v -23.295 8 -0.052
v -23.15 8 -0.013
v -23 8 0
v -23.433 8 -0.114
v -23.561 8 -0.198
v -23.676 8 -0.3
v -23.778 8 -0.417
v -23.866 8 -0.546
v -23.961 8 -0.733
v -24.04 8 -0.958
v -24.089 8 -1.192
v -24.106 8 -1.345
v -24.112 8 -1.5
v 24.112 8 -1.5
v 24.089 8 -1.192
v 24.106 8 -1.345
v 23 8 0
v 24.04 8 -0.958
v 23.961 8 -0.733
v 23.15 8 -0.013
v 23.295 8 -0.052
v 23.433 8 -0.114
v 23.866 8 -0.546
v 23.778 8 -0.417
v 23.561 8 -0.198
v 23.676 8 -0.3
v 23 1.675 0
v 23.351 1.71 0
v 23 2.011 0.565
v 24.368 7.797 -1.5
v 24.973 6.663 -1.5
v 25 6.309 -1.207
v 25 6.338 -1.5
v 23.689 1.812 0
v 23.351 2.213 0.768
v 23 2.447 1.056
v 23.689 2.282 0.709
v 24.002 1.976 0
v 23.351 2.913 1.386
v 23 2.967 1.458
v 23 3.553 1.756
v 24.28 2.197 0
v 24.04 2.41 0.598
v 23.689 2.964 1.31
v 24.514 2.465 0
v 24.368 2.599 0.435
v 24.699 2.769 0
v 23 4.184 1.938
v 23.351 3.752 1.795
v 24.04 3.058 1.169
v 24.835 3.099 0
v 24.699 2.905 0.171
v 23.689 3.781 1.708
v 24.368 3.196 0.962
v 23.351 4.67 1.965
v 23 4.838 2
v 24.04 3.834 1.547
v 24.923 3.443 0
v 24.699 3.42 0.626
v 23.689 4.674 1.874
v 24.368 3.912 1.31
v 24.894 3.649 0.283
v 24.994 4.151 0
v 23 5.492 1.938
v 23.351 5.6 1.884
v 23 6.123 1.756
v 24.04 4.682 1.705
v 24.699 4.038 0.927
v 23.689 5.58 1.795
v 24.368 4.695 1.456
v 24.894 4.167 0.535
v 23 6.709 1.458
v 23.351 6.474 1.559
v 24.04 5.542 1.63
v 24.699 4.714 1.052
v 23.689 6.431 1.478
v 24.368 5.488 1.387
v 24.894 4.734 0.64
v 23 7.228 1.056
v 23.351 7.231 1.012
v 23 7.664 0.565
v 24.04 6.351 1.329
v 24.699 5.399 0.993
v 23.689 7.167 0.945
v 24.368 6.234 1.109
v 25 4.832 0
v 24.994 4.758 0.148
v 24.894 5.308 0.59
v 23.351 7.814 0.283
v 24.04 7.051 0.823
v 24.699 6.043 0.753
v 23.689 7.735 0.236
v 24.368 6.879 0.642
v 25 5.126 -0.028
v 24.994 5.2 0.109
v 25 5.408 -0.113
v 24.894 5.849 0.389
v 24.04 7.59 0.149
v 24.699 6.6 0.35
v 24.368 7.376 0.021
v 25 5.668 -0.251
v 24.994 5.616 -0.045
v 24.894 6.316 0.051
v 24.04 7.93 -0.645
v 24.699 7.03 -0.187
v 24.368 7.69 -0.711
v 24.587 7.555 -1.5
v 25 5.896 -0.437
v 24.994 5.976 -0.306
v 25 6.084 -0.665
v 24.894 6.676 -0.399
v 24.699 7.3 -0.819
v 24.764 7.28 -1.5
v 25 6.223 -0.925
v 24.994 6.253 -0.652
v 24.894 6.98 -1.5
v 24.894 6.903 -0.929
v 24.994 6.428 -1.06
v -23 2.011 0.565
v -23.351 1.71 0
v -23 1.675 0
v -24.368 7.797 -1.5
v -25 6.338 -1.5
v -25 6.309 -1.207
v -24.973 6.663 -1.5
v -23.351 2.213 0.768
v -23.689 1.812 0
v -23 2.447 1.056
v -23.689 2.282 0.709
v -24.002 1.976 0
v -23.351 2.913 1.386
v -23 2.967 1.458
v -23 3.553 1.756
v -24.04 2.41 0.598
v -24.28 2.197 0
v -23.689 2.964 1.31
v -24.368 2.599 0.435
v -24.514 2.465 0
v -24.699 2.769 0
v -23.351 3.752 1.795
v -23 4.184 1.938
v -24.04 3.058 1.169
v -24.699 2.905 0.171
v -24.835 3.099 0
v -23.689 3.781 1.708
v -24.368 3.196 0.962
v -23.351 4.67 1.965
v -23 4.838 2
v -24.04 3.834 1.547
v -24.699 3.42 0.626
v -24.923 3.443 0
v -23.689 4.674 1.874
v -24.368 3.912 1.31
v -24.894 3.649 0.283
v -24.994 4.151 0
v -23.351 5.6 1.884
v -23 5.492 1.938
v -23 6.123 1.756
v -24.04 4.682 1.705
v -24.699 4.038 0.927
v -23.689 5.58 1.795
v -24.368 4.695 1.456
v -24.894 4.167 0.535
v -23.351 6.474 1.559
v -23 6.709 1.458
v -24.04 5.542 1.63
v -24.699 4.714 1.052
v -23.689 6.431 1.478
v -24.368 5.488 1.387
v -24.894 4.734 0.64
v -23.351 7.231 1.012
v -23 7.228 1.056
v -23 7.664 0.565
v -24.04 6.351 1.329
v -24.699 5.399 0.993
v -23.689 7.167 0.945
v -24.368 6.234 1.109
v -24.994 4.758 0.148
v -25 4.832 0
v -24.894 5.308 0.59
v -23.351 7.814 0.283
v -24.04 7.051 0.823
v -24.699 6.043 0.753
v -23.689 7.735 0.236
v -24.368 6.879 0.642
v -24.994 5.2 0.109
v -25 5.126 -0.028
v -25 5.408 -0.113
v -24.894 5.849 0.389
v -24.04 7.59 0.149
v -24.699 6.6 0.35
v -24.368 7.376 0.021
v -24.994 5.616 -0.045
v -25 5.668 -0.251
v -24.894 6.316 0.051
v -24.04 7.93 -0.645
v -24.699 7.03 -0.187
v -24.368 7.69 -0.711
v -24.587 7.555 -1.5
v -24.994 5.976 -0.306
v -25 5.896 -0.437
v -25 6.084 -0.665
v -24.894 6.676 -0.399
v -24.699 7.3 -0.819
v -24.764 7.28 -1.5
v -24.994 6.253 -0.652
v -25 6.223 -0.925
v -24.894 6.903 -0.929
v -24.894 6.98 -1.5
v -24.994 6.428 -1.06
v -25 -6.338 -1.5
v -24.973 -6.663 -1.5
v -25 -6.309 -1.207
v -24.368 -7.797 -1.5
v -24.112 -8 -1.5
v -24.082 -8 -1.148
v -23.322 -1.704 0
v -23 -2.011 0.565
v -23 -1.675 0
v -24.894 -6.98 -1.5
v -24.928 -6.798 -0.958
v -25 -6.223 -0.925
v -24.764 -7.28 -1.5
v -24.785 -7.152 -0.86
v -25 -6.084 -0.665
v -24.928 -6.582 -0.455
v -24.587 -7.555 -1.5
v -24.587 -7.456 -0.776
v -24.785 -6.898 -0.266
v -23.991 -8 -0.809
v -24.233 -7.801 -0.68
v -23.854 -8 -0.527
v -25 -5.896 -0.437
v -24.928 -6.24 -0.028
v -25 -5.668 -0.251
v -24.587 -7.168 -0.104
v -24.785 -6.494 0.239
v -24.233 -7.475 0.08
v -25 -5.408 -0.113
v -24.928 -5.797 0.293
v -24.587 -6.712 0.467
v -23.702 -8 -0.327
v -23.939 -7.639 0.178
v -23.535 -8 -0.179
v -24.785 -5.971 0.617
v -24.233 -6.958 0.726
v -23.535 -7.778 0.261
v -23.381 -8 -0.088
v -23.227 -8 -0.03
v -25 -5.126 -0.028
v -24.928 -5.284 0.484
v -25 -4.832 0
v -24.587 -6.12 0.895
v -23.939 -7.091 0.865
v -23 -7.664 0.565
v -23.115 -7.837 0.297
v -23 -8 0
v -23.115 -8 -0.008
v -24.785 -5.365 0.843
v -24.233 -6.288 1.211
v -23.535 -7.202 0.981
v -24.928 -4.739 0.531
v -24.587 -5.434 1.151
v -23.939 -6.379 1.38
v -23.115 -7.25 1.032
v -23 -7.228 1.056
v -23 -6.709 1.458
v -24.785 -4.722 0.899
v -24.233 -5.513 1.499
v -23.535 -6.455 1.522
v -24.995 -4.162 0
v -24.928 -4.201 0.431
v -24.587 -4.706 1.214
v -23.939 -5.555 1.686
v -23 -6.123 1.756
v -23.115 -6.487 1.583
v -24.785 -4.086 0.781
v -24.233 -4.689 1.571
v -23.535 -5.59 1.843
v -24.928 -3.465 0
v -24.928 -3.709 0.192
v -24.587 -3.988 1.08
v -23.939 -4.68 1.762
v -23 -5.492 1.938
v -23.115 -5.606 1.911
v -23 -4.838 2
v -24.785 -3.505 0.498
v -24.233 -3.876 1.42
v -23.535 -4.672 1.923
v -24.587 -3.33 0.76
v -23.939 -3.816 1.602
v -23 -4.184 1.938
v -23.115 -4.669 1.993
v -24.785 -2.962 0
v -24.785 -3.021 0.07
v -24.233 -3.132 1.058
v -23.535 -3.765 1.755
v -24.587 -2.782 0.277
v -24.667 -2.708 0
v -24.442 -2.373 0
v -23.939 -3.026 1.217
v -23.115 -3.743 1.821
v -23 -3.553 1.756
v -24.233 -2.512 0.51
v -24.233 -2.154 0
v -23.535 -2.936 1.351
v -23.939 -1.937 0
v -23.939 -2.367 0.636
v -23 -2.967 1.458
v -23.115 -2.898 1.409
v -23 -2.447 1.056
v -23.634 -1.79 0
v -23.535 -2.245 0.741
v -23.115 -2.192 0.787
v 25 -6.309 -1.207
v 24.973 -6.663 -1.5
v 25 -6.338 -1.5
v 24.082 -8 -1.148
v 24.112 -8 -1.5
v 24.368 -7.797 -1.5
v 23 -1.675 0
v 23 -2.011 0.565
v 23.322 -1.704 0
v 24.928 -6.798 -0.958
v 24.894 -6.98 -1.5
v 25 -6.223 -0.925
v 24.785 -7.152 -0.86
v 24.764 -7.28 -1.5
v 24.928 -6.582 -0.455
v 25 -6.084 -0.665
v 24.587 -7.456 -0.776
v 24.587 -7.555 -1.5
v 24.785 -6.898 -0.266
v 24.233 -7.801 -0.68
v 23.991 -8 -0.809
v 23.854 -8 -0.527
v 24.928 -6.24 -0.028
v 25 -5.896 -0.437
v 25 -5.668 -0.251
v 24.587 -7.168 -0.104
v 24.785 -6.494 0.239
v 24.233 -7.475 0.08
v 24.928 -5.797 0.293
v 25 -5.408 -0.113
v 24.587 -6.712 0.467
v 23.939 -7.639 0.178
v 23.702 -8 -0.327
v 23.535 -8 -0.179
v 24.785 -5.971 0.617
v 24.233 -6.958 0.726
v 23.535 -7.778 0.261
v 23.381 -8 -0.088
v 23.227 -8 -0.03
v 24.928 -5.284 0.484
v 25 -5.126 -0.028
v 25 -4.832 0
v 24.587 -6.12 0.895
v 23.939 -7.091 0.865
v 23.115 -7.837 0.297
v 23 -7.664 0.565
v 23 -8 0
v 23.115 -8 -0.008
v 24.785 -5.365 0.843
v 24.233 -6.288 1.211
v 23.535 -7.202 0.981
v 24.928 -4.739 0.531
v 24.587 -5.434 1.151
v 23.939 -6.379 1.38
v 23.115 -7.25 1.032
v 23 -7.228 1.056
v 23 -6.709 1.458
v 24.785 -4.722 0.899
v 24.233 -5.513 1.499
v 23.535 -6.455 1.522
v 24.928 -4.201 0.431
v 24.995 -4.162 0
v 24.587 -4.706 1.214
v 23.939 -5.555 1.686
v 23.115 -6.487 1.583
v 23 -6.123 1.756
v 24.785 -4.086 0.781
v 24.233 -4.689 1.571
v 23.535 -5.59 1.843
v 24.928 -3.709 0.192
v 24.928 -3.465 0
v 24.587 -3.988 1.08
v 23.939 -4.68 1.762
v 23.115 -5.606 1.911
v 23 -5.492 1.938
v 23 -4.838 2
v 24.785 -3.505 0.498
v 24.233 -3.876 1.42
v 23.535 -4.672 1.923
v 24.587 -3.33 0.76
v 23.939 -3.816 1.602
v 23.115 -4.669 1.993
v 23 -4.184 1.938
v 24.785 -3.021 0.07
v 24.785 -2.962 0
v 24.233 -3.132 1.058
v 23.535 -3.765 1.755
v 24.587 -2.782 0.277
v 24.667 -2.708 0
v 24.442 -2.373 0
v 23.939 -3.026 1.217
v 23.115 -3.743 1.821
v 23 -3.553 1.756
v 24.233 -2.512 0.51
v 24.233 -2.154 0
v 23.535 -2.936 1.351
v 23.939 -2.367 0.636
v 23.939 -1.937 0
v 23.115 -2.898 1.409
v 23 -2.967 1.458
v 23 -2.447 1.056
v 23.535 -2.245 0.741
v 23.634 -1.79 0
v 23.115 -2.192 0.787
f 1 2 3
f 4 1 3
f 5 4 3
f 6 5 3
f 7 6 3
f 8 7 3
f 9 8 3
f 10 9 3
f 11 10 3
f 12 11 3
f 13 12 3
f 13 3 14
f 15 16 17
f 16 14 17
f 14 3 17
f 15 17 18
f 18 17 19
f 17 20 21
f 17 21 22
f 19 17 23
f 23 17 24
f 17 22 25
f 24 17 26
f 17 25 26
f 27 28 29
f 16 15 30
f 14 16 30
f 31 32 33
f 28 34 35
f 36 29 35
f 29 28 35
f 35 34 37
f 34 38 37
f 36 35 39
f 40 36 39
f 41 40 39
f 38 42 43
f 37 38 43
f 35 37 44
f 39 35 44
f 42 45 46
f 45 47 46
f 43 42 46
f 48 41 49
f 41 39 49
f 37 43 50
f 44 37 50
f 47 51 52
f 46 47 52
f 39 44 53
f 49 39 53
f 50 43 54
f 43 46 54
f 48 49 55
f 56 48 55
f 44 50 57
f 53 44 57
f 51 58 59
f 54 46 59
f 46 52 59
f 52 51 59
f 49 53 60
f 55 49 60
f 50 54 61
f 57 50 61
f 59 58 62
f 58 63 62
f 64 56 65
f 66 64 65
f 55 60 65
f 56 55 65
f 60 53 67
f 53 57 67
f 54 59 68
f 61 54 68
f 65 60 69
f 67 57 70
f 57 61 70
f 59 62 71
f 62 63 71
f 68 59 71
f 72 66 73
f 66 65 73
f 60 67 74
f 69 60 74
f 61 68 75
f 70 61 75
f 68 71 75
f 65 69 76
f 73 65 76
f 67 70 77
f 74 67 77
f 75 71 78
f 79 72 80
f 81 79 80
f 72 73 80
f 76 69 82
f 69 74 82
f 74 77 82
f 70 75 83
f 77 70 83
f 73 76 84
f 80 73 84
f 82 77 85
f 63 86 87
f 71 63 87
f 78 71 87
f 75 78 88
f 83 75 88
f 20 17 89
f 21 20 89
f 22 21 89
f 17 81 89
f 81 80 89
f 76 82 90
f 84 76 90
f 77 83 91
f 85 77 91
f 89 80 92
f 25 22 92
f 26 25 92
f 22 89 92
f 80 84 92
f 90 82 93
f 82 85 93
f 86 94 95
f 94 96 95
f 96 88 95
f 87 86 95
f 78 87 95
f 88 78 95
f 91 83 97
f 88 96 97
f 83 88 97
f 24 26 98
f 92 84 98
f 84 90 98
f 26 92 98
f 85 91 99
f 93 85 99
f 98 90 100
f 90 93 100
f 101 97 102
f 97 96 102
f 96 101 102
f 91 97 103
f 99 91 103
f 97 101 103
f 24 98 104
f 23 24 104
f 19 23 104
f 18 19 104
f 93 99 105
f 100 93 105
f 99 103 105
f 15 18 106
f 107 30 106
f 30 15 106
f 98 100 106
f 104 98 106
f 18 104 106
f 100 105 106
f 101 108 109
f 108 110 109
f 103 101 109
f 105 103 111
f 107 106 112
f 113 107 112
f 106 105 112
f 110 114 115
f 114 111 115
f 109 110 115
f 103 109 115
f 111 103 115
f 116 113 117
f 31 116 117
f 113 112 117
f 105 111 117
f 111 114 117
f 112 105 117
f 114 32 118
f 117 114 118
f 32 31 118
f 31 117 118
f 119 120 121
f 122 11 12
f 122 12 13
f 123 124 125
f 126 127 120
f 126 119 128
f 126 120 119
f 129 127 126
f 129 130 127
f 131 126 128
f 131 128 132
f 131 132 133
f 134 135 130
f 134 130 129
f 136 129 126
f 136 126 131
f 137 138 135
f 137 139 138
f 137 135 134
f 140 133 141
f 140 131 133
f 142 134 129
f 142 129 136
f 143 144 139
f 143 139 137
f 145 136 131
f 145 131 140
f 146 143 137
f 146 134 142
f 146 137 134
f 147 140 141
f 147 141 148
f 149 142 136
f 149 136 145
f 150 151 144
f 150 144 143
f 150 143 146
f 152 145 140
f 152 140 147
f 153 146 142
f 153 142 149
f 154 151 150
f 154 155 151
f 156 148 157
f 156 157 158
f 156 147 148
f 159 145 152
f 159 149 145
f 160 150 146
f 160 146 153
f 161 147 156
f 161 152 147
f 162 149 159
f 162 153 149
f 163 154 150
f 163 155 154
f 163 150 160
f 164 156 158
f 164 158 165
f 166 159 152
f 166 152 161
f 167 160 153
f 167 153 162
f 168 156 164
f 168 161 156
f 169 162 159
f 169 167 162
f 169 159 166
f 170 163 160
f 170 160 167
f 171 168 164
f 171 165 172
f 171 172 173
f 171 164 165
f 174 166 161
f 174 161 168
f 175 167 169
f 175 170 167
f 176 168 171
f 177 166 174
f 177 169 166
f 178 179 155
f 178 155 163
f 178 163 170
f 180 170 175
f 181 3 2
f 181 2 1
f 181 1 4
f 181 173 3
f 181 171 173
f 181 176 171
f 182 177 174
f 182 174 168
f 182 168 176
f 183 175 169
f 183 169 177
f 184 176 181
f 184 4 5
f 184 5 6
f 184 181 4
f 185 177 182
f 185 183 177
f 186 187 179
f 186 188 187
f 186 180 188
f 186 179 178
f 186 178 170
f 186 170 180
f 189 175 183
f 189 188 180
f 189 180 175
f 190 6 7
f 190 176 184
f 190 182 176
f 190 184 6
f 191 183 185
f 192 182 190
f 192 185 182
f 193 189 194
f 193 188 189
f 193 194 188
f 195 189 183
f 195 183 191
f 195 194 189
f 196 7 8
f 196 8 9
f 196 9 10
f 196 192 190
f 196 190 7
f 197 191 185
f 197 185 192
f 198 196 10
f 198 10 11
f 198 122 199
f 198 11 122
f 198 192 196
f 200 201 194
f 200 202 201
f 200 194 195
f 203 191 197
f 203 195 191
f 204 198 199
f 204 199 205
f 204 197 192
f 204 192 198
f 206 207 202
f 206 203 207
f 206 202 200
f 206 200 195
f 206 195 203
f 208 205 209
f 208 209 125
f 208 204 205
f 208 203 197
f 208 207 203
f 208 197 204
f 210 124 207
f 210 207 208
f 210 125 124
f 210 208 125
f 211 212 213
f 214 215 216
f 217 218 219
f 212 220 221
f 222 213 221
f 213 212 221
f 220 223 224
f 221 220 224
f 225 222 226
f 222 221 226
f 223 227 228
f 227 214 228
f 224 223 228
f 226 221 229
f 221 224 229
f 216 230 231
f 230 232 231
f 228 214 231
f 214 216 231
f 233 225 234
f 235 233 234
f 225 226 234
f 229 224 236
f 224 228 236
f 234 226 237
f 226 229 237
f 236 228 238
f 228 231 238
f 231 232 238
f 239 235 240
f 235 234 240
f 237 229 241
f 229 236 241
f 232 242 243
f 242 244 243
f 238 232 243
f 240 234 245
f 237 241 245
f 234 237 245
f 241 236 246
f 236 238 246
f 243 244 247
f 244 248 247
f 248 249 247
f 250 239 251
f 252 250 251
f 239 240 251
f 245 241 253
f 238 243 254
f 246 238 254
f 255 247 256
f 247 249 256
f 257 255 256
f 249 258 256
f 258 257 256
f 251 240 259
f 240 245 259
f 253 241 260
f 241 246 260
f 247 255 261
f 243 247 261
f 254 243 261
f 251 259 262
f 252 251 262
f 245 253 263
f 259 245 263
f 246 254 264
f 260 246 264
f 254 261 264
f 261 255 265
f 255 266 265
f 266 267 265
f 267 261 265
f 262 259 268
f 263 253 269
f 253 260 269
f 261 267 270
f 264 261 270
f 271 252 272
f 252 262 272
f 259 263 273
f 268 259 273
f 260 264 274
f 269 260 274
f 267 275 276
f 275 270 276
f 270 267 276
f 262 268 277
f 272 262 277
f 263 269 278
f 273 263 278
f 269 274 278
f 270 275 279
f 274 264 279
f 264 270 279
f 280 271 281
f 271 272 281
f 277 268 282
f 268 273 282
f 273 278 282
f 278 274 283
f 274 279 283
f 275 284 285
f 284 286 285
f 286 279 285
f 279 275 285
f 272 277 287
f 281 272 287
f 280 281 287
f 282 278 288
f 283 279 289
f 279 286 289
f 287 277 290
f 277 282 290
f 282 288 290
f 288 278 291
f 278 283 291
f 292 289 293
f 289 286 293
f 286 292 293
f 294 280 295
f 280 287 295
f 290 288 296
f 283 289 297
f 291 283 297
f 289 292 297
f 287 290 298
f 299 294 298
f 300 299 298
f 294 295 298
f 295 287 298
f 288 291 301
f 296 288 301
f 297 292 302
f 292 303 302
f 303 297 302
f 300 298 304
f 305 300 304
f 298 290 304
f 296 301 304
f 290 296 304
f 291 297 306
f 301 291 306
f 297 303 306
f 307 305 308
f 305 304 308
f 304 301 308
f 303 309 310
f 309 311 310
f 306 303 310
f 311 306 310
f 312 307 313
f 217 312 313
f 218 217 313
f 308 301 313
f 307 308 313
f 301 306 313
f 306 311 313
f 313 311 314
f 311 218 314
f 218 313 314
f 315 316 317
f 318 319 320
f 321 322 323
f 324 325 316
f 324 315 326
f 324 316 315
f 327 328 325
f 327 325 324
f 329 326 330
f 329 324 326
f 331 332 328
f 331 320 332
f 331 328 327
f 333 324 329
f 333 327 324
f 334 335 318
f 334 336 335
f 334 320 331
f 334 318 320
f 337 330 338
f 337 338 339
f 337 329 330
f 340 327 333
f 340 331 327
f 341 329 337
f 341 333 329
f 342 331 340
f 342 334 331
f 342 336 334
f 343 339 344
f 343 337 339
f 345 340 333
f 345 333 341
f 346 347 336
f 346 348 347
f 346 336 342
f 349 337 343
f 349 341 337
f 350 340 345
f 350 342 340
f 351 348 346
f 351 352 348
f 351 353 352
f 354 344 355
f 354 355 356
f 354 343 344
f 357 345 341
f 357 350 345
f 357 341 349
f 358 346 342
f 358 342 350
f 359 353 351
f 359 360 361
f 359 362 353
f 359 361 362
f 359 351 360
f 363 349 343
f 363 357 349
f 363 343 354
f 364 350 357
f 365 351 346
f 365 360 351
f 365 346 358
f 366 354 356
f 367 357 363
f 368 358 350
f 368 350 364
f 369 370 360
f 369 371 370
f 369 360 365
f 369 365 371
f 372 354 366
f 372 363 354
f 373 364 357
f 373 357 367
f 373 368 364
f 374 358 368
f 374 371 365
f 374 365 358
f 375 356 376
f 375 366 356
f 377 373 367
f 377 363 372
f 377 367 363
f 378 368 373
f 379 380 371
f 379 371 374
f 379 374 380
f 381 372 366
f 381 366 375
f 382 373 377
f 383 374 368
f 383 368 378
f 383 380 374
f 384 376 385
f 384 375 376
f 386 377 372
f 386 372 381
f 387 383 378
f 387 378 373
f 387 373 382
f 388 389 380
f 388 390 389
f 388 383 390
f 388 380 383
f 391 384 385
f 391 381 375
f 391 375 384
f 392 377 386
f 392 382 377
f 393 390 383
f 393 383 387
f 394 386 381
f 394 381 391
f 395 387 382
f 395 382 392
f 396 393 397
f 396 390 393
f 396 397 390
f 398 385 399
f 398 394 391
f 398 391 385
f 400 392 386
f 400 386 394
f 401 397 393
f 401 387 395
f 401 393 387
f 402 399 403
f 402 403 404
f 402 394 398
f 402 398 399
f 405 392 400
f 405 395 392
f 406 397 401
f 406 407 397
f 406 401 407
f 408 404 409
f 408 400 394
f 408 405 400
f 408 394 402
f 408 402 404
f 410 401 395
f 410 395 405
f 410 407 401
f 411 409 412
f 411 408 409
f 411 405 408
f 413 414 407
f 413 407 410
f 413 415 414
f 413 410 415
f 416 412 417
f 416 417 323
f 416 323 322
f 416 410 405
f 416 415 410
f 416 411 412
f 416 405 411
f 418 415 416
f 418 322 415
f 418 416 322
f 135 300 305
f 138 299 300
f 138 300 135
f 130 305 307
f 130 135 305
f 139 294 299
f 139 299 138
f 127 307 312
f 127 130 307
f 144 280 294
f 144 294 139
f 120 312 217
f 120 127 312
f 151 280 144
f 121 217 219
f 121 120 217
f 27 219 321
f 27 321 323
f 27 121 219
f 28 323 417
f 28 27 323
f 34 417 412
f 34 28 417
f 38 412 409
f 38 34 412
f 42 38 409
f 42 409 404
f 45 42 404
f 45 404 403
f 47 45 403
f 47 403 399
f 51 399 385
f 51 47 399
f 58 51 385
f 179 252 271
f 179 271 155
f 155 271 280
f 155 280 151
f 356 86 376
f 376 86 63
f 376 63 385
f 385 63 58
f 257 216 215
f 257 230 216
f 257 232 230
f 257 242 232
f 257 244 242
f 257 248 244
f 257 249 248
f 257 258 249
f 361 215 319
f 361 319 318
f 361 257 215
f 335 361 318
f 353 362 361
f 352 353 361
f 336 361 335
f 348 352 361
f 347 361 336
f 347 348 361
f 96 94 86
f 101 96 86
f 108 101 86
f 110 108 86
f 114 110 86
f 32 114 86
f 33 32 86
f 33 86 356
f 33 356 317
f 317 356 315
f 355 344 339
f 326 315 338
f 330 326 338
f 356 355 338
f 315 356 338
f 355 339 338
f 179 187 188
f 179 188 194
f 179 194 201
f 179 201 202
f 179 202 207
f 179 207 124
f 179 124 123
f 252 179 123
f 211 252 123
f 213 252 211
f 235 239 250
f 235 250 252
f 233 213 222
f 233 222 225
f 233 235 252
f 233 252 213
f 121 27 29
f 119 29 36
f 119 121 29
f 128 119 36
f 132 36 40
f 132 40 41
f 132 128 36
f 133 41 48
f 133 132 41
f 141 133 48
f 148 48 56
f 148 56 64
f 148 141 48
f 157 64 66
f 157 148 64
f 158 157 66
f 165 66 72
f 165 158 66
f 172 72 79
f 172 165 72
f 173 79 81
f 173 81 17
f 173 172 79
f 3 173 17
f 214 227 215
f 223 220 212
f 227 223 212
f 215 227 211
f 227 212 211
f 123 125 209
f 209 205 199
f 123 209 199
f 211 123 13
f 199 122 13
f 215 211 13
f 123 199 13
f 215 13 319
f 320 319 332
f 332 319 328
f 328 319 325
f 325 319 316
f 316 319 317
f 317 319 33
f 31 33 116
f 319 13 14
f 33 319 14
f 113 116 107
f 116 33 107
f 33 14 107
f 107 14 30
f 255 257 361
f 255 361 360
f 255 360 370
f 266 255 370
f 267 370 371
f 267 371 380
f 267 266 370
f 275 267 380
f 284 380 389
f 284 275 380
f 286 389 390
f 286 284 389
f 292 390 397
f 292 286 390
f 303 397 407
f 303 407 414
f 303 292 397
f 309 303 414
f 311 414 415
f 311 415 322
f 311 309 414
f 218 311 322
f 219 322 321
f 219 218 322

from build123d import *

# Parameters (mm, degrees)
F0_W     = 50
F0_H     = 16
F1_DEPTH = 1.5
F3_DEPTH = 50
F4_R     = 1.99999


# Not quite as in the source:
# - a fillet or chamfer is up to 0.001 mm smaller than in the source, because OpenCascade refuses the exact size


with BuildPart() as f1:
    # F0 (on Top) → F1 (new body)
    with BuildSketch(Plane.XY):
        Rectangle(F0_W, F0_H)
    extrude(amount=-F1_DEPTH)

    # F2 (on face) → F3 (join)
    with BuildSketch(Plane(origin=(-25, 0, 0), x_dir=(0, -1, 0), z_dir=(-1, 0, 0))):
        with BuildLine():
            ThreePointArc((-1.6754446797, 0), (-4.8377223398, 2), (-8, 0))
            Line((-8, 0), (-1.6754446797, 0))
        make_face()
        with BuildLine():
            ThreePointArc((8, 0), (4.8377223398, 2), (1.6754446797, 0))
            Line((1.6754446797, 0), (8, 0))
        make_face()
    extrude(amount=-F3_DEPTH)

    # F4 (radius 2 in the source; OpenCascade refuses exactly that, so slightly less here)
    f4_edges = [f1.edges().sort_by_distance(p)[0] for p in [
        (-25, -4.837722, 2),
        (-25, 4.837722, 2),
        (25, -4.837722, 2),
        (25, 4.837722, 2),
    ]]
    fillet(f4_edges, radius=F4_R)


solid = f1.part
